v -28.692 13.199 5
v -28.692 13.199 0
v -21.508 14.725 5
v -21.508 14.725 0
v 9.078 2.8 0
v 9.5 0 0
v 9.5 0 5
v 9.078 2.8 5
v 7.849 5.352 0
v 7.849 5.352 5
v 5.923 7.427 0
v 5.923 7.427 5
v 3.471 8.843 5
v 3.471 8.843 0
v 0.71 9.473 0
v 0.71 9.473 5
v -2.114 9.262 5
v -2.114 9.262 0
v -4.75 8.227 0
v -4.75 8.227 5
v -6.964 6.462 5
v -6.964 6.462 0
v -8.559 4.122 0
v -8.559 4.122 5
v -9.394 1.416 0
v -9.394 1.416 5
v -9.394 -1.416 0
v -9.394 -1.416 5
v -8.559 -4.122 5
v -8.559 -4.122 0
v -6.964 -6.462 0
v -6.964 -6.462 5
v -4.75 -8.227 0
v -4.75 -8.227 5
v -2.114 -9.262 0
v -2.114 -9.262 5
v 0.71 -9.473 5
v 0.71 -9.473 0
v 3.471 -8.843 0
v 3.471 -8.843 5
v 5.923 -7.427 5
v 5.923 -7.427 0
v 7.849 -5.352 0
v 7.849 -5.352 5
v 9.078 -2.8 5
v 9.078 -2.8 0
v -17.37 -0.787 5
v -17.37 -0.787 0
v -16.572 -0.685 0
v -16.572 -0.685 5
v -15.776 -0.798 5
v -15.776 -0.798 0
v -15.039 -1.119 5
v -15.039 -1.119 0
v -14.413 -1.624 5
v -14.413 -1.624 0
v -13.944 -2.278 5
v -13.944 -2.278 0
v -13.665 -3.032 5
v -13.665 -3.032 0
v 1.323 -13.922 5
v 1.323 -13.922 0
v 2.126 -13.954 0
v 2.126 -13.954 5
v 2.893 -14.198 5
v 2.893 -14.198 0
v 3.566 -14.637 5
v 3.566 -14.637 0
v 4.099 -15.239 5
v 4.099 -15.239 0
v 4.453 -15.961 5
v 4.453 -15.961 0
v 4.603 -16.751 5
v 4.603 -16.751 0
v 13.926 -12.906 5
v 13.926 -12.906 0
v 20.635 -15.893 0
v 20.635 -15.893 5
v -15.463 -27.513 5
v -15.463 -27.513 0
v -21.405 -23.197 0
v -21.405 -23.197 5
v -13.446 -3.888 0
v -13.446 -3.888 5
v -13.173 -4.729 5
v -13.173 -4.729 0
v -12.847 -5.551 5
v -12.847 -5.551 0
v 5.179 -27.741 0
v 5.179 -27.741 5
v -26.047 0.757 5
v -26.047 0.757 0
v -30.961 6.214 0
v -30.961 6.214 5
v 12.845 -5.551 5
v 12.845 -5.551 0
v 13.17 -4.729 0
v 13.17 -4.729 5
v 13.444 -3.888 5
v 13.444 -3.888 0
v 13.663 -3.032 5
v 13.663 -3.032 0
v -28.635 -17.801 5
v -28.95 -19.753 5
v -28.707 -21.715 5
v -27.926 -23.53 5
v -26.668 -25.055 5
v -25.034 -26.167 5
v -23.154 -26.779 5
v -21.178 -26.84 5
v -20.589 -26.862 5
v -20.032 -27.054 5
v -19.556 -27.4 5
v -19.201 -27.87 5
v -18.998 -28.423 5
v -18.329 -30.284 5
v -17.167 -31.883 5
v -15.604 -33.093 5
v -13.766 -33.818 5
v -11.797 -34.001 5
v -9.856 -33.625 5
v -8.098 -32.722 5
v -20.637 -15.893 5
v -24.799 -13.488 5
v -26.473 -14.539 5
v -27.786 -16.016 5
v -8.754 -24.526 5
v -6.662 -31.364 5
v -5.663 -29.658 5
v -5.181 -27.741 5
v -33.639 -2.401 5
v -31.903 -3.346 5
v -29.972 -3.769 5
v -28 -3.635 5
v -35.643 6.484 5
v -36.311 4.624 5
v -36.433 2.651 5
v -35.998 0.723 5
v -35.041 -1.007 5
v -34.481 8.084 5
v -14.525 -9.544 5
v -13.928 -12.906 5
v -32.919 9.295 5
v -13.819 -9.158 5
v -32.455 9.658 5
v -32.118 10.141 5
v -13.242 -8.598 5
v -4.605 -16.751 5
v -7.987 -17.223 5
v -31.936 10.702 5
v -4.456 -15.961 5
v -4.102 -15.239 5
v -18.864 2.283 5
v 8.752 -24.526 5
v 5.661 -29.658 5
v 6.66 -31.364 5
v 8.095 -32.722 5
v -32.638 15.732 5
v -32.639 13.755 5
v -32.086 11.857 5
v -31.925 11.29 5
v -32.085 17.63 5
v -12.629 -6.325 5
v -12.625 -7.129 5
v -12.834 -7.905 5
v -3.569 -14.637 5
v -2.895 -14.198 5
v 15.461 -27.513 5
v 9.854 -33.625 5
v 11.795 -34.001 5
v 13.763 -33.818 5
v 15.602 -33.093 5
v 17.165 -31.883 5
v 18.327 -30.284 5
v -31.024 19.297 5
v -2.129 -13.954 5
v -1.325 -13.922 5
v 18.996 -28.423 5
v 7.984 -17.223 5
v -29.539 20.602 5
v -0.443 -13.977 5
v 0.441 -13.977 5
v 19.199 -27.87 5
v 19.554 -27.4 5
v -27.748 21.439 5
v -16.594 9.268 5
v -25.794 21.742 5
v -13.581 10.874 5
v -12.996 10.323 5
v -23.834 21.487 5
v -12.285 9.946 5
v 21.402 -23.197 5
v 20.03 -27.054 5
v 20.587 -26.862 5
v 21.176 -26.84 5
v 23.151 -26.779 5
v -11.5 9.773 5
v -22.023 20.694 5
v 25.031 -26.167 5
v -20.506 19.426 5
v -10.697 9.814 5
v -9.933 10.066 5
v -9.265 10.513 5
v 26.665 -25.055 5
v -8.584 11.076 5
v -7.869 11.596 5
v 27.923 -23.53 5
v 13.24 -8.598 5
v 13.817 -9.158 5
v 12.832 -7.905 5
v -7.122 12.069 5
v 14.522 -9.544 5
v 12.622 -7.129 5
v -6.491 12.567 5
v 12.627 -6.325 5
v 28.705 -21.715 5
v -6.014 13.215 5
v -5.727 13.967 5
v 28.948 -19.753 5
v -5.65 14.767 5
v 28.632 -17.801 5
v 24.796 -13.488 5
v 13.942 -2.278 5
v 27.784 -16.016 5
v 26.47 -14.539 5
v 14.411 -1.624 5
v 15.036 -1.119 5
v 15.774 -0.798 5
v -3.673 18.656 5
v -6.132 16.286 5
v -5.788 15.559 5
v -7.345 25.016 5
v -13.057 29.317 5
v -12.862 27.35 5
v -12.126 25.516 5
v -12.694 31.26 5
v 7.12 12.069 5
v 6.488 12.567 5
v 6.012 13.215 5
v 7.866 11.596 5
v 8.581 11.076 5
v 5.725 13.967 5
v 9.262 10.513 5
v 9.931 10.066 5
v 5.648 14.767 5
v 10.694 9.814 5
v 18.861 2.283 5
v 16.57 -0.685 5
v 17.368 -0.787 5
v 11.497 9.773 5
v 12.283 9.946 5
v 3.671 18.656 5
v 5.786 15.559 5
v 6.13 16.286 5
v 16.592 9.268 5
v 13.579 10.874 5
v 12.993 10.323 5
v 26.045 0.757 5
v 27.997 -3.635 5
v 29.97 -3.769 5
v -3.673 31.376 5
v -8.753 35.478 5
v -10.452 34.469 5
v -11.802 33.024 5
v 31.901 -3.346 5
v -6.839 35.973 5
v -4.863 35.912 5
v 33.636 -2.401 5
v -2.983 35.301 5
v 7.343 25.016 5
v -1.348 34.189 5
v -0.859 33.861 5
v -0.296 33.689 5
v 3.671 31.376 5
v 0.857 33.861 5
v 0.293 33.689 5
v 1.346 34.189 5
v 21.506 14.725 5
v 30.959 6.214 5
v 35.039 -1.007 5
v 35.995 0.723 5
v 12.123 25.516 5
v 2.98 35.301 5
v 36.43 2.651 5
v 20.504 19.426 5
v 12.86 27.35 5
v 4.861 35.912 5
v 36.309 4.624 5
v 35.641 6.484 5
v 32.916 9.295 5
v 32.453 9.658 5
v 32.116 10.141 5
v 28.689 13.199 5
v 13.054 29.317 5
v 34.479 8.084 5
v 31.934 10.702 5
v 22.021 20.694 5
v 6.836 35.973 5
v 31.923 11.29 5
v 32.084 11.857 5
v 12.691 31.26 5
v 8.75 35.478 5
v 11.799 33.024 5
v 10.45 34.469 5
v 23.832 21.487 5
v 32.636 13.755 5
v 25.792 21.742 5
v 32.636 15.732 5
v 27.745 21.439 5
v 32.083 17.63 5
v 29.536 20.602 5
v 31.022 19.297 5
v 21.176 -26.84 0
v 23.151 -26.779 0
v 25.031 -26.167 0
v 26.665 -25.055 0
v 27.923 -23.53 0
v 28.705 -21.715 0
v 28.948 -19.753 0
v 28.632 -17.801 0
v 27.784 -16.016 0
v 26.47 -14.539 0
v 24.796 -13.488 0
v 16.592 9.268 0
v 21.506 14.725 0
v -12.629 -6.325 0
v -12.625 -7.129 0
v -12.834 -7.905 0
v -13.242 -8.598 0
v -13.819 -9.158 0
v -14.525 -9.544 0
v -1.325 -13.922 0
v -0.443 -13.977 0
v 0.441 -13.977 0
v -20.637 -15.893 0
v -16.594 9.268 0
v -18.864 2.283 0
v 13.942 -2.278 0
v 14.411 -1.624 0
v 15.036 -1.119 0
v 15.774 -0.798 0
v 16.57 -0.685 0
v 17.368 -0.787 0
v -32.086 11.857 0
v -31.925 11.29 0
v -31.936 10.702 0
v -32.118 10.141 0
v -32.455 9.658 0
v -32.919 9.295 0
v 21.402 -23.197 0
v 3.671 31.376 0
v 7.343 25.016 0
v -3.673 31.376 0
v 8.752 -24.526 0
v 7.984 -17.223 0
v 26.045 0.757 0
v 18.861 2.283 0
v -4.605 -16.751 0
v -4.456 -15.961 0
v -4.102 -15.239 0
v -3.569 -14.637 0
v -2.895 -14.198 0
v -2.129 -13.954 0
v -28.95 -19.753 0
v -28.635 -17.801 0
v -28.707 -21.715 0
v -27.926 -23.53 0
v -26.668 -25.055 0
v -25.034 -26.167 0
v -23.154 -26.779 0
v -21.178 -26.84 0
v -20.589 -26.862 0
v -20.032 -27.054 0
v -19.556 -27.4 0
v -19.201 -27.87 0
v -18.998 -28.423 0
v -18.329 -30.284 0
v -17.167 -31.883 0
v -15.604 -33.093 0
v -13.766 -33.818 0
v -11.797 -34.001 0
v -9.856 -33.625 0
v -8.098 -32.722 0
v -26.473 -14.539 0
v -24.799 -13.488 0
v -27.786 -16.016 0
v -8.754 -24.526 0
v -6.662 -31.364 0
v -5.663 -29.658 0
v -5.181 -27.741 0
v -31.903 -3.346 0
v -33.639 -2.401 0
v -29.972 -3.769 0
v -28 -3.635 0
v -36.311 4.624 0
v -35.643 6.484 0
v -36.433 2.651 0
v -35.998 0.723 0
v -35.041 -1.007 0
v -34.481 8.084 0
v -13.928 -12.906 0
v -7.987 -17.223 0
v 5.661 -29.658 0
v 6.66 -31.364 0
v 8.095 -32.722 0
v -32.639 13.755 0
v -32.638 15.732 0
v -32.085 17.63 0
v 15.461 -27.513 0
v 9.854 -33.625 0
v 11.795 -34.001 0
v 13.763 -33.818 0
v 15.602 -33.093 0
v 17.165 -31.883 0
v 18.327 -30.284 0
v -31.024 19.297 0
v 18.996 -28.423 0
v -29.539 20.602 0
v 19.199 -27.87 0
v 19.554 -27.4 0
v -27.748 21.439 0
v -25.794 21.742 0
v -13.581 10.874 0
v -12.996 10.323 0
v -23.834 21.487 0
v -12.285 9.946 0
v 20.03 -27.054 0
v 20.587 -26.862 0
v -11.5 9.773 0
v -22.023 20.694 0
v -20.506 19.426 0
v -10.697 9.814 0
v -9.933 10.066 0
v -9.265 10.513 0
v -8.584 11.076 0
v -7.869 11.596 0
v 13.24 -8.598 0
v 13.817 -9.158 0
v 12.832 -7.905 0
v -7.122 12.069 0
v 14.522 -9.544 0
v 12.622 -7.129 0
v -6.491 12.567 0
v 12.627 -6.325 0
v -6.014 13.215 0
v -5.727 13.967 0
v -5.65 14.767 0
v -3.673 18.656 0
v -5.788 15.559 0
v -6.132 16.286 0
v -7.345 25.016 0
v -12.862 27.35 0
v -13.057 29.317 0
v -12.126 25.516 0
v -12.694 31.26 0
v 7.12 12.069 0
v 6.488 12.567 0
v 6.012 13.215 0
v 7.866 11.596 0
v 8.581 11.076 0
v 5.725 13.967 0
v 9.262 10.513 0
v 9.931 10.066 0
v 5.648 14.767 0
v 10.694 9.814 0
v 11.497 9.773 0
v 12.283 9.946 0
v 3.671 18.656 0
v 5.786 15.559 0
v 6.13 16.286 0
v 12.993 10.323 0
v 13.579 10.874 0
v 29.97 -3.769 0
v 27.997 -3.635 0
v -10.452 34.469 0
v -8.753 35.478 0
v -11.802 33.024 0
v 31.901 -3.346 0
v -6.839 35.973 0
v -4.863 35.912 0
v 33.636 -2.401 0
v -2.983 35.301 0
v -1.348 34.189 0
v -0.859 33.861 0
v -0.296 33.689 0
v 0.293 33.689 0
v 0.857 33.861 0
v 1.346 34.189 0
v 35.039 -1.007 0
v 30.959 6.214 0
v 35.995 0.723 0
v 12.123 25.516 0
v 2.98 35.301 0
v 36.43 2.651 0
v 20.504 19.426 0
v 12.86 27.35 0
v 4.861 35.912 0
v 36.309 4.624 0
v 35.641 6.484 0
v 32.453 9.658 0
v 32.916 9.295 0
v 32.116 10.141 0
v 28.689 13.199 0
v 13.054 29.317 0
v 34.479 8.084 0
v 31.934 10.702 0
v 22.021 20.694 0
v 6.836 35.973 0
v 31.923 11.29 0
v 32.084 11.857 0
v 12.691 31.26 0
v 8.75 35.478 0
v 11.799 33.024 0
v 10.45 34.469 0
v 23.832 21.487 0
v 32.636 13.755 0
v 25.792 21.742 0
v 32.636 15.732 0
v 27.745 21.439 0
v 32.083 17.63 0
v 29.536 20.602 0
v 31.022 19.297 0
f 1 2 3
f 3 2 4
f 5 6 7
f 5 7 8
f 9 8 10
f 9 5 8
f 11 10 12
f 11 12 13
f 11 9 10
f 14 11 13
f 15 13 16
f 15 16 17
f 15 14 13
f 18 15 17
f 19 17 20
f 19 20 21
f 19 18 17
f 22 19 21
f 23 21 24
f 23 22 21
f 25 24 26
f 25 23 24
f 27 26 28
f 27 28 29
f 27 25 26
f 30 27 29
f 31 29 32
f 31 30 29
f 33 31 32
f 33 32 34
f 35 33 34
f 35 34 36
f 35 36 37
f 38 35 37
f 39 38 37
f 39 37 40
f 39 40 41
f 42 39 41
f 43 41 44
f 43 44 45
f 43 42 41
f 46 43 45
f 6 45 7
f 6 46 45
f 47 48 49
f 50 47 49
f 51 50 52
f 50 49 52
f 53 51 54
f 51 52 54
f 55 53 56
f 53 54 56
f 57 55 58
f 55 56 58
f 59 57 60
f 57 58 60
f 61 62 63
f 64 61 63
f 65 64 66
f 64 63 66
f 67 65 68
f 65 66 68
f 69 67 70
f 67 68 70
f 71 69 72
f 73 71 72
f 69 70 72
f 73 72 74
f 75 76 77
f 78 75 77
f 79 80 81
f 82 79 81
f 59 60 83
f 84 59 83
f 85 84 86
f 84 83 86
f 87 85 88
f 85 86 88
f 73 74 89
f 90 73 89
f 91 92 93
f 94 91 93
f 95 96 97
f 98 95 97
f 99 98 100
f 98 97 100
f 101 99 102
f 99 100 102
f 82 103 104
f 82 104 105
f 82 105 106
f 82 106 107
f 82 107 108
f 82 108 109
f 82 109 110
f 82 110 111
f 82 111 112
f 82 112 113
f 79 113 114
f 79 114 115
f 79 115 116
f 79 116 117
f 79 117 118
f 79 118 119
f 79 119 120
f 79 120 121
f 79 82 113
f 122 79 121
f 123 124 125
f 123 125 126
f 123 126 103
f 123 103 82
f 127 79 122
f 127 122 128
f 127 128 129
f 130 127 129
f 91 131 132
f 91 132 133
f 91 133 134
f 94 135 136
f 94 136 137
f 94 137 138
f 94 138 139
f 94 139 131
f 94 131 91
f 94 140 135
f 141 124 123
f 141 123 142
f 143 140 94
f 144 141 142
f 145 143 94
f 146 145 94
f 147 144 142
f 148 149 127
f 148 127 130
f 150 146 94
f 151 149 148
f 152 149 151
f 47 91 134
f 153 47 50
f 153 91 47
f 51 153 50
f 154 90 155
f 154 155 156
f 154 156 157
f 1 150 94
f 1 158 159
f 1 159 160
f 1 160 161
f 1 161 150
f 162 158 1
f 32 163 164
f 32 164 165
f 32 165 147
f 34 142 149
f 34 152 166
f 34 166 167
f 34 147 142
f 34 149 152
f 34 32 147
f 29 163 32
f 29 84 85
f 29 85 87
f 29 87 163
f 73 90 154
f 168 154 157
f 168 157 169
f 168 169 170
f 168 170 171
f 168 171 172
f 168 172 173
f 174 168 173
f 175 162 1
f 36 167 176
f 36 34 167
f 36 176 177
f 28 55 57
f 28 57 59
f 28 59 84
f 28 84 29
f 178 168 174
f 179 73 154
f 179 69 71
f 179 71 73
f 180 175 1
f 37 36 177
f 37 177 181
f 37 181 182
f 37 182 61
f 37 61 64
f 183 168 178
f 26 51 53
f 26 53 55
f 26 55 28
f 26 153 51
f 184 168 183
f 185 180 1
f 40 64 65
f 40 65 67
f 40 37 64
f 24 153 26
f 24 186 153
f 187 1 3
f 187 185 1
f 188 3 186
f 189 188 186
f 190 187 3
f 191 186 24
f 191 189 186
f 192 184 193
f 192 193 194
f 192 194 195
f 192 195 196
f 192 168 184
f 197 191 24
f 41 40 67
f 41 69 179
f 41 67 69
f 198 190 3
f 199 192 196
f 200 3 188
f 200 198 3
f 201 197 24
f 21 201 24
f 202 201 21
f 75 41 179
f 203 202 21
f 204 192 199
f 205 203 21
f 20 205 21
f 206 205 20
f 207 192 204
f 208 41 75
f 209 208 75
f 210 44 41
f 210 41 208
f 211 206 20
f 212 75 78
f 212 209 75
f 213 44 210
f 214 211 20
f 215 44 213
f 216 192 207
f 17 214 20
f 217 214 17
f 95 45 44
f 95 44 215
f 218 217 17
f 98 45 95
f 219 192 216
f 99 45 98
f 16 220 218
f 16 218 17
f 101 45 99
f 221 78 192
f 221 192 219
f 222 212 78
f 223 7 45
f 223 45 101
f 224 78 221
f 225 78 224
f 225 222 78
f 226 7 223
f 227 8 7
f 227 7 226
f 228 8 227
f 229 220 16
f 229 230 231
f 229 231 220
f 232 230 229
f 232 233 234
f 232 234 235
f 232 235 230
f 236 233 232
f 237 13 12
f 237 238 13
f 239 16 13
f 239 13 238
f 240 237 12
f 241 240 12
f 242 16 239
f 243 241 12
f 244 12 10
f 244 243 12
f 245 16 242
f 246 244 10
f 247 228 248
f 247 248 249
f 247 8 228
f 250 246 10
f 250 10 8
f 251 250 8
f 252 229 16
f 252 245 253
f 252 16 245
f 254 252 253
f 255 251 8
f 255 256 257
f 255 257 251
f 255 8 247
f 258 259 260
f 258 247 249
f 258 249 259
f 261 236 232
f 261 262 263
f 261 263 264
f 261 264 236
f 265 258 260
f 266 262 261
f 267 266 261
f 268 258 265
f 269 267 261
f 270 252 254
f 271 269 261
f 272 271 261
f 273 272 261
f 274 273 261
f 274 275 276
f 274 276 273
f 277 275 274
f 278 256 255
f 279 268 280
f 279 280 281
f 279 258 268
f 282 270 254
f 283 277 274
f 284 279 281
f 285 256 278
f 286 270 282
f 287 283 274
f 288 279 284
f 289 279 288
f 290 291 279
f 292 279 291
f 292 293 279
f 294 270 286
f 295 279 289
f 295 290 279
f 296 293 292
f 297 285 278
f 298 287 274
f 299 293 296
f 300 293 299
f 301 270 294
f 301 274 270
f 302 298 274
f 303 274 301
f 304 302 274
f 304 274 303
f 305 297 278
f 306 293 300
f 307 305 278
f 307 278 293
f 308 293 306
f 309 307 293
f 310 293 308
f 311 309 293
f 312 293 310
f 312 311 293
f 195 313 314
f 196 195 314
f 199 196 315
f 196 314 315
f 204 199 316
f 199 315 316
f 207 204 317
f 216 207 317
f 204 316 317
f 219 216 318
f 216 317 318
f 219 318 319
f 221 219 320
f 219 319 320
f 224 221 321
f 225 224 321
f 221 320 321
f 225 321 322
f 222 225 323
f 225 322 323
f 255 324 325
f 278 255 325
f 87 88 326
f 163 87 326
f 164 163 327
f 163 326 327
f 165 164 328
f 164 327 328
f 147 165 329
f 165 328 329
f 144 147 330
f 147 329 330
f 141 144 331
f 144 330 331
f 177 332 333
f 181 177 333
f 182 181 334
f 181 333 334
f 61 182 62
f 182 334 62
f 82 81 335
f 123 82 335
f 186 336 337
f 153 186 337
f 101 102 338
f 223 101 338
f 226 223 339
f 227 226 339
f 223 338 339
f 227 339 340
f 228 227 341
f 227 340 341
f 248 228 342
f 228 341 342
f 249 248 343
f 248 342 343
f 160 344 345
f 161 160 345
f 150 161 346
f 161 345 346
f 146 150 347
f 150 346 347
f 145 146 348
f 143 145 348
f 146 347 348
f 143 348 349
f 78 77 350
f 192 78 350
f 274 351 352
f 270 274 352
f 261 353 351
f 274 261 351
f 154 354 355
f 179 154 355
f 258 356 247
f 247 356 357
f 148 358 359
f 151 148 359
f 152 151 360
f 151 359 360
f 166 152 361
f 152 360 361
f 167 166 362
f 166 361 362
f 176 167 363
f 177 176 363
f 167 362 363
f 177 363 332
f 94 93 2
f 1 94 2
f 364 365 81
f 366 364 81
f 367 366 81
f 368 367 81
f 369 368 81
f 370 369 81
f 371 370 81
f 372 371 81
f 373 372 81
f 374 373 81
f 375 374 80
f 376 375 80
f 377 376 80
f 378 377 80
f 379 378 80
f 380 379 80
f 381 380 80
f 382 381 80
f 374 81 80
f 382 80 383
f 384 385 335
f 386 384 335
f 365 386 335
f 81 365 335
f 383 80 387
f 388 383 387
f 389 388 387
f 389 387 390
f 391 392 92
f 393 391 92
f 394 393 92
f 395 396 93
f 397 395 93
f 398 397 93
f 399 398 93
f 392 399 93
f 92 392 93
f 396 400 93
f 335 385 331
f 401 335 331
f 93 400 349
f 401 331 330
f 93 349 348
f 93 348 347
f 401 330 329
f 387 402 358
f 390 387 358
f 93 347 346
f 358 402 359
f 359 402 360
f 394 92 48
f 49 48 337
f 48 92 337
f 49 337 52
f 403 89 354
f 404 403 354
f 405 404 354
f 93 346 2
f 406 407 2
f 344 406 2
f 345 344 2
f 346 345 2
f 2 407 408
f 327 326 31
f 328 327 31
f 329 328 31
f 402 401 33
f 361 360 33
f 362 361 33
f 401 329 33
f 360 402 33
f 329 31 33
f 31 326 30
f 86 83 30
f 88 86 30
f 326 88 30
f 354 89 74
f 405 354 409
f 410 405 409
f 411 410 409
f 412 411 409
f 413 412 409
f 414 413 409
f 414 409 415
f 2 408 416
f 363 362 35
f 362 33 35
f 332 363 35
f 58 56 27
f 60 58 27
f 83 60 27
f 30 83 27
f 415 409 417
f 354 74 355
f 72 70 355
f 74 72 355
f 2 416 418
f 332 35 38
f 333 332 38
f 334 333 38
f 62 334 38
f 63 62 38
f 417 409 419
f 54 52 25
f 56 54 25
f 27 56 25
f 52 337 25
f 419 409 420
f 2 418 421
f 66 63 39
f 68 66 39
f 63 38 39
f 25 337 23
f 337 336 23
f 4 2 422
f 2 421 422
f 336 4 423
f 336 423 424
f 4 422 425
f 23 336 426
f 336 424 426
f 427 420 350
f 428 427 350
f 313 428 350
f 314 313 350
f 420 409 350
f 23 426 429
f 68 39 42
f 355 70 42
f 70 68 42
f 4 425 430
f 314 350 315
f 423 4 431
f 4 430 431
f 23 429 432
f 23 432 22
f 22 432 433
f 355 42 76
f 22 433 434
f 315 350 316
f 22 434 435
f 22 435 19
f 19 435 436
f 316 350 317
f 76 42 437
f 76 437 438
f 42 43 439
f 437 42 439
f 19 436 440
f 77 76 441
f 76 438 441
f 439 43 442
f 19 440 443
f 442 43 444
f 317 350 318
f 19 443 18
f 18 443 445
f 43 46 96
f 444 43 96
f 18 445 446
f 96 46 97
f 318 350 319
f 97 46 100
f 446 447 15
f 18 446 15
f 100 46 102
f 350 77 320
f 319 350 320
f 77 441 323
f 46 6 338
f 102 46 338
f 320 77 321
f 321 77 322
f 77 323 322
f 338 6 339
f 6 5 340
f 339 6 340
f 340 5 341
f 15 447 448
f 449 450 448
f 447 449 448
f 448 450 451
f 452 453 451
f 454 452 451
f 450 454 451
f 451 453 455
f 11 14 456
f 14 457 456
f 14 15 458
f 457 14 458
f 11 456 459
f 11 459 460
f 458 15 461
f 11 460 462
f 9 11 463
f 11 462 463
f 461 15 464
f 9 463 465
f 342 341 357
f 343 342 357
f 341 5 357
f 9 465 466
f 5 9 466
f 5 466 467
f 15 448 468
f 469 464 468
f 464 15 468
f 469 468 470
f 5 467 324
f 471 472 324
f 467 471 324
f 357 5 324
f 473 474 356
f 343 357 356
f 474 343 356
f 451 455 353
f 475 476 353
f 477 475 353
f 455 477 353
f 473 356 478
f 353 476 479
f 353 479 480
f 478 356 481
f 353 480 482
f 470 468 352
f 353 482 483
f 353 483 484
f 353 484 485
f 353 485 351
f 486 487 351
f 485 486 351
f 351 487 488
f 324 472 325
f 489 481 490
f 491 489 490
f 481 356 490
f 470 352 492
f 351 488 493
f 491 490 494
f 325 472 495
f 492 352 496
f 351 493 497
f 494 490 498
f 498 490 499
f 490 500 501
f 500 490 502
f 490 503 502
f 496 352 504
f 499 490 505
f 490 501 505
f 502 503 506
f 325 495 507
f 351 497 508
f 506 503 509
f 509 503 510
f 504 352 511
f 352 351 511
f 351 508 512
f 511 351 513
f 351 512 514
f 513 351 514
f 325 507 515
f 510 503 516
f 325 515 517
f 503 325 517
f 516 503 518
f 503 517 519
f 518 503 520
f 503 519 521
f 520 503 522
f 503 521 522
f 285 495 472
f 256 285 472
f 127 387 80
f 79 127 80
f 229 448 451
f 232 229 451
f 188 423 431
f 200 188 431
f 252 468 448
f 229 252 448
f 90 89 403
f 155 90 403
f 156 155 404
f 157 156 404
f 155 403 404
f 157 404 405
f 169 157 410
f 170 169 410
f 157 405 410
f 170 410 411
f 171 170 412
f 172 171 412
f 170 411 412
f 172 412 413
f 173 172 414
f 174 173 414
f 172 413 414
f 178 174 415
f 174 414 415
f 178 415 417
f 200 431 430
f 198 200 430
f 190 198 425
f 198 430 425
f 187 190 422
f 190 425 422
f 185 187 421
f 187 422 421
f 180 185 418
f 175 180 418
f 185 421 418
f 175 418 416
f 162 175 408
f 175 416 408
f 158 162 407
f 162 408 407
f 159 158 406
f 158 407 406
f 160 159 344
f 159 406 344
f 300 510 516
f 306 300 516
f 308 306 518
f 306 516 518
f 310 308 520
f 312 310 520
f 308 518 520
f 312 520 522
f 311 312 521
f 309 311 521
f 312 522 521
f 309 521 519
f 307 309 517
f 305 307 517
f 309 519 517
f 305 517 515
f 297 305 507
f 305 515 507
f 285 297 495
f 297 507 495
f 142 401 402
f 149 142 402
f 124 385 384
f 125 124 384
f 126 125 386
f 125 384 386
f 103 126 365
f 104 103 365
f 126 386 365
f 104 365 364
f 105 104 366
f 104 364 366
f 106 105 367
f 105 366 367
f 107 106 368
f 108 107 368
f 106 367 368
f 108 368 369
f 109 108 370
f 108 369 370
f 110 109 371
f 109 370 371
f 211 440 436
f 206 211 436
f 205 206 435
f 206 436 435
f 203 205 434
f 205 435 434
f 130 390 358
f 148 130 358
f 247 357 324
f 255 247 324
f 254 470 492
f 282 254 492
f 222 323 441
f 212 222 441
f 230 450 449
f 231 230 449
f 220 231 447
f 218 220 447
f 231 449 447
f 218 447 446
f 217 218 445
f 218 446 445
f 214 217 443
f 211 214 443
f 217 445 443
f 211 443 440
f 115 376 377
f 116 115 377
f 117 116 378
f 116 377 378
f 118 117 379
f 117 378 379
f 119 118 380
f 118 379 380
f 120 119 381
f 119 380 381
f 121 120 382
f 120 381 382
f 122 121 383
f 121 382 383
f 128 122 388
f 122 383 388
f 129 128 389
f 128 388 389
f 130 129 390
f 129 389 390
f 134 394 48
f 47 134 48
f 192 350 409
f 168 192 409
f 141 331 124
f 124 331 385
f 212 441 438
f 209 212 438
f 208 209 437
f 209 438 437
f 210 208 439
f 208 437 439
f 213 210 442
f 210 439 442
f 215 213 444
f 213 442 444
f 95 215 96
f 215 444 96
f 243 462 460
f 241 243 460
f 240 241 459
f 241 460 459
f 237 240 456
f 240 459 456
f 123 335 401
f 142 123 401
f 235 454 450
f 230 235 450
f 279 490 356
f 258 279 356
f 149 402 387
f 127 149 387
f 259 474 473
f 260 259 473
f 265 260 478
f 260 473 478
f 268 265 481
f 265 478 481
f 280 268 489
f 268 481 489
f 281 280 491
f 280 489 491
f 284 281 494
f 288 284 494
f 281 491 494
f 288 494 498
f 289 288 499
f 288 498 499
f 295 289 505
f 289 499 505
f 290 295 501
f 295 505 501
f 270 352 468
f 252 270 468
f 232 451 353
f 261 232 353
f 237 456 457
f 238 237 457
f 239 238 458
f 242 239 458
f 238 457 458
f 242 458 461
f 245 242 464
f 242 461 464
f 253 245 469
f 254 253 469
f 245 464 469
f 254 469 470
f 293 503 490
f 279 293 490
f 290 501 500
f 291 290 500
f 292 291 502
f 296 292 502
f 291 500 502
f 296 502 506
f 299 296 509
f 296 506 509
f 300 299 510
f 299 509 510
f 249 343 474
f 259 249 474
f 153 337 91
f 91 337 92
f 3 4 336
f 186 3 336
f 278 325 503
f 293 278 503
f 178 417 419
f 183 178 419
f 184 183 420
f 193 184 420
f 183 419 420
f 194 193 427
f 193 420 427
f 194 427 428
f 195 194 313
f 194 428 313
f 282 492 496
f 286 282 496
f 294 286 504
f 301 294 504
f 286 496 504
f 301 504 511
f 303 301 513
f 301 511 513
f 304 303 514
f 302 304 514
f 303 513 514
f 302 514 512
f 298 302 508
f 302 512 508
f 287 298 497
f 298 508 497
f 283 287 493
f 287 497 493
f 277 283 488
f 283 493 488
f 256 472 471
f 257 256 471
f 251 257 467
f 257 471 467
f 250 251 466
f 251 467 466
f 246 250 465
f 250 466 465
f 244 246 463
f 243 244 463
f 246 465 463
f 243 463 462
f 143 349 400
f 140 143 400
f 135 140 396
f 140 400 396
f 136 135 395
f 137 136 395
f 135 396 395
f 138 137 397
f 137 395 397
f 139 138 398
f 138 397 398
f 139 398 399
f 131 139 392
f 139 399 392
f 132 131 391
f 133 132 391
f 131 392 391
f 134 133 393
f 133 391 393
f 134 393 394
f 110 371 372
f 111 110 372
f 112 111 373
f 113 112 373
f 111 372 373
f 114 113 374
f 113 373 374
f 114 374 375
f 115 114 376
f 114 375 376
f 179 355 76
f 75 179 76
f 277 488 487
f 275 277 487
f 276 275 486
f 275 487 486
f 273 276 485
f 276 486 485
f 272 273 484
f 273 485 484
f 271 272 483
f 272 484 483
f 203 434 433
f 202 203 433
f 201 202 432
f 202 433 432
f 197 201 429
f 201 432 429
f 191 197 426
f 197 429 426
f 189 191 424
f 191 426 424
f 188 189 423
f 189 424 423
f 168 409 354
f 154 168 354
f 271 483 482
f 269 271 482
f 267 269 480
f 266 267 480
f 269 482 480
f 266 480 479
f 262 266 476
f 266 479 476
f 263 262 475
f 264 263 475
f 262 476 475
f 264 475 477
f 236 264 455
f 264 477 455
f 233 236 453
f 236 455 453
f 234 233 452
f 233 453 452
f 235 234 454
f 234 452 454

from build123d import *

# Parameters (mm, degrees)
F0_R     = 9.5
F1_DEPTH = 5


# Not quite as in the source:
# - a feature names something its author has since deleted; it is built from what else it names


with BuildPart() as f1:
    # F0 (on Top) → F1 (new body)
    with BuildSketch(Plane.XY):
        with BuildLine():
            ThreePointArc((-13.665469042, -3.0319204432), (-13.3159762762, 4.3418317), (-9.2645390994, 10.5127491897))
            ThreePointArc((-9.2645390994, 10.5127491897), (-11.4998669549, 9.7726015122), (-13.5809814233, 10.8741784618))
            Line((-13.5809814233, 10.8741784618), (-20.506494271, 19.426474585))
            ThreePointArc((-20.506494271, 19.426474585), (-29.538567909, 20.601795911), (-32.0861364699, 11.8571044442))
            ThreePointArc((-32.0861364699, 11.8571044442), (-32.0062029861, 10.4146544851), (-32.9187213461, 9.2946716776))
            ThreePointArc((-32.9187213461, 9.2946716776), (-35.997695766, 0.7226444411), (-27.9997581563, -3.6354203143))
            Line((-27.9997581563, -3.6354203143), (-17.3699870332, -0.7871817262))
            ThreePointArc((-17.3699870332, -0.7871817262), (-15.0388393758, -1.1192356462), (-13.665469042, -3.0319204432))
        make_face()
        Polygon((-28.6916231536, 13.1985965214), (-21.5082094645, 14.7254782362), (-16.5941842664, 9.267900353), (-18.8635727573, 2.2834407549), (-26.0469864464, 0.7565590401), (-30.9610116446, 6.2141369233), align=None, mode=Mode.SUBTRACT)
        with BuildLine():
            ThreePointArc((9.2621690031, 10.5127491897), (8.227808484, 11.3418317), (7.1196691813, 12.0693664265))
            ThreePointArc((7.1196691813, 12.0693664265), (-0.0011850481, 14.0155937788), (-7.1220392775, 12.0693664265))
            ThreePointArc((-7.1220392775, 12.0693664265), (-8.2301785802, 11.3418317), (-9.2645390994, 10.5127491897))
            ThreePointArc((-9.2645390994, 10.5127491897), (-13.3159762762, 4.3418317), (-13.665469042, -3.0319204432))
            ThreePointArc((-13.665469042, -3.0319204432), (-13.3159762762, -4.3106441425), (-12.847106931, -5.5505800398))
            ThreePointArc((-12.847106931, -5.5505800398), (-8.2301785802, -11.3106441425), (-1.3253227589, -13.9216462393))
            ThreePointArc((-1.3253227589, -13.9216462393), (-0.0011850481, -13.9844062212), (1.3229526627, -13.9216462393))
            ThreePointArc((1.3229526627, -13.9216462393), (8.227808484, -11.3106441425), (12.8447368348, -5.5505800398))
            ThreePointArc((12.8447368348, -5.5505800398), (13.31360618, -4.3106441425), (13.6630989458, -3.0319204432))
            ThreePointArc((13.6630989458, -3.0319204432), (13.9146328566, -1.5173811207), (13.9988149519, 0.0155937788))
            ThreePointArc((13.9988149519, 0.0155937788), (12.7598289539, 5.7737637694), (9.2621690031, 10.5127491897))
        make_face()
        Circle(F0_R, mode=Mode.SUBTRACT)
        with BuildLine():
            ThreePointArc((-1.3253227589, -13.9216462393), (-8.2301785802, -11.3106441425), (-12.847106931, -5.5505800398))
            ThreePointArc((-12.847106931, -5.5505800398), (-12.8339389546, -7.9052213736), (-14.5247006287, -9.5440728519))
            Line((-14.5247006287, -9.5440728519), (-24.7985187507, -13.4878221314))
            ThreePointArc((-24.7985187507, -13.4878221314), (-28.7073800051, -21.7146403569), (-21.1779261823, -26.8397803113))
            ThreePointArc((-21.1779261823, -26.8397803113), (-19.7813739443, -27.2095006015), (-18.998190678, -28.4234508549))
            ThreePointArc((-18.998190678, -28.4234508549), (-11.7971637379, -34.0006316328), (-5.1808992125, -27.7408570242))
            Line((-5.1808992125, -27.7408570242), (-4.6049551583, -16.7511898031))
            ThreePointArc((-4.6049551583, -16.7511898031), (-3.5687888714, -14.6367469374), (-1.3253227589, -13.9216462393))
        make_face()
        Polygon((-21.4047986615, -23.1968624525), (-20.6371525584, -15.8931976559), (-13.9281702523, -12.906166284), (-7.9868340493, -17.2227997087), (-8.7544801524, -24.5264645053), (-15.4634624585, -27.5134958771), align=None, mode=Mode.SUBTRACT)
        with BuildLine():
            ThreePointArc((7.1196691813, 12.0693664265), (5.7249926142, 13.9665713389), (6.1295548123, 16.2862348132))
            Line((6.1295548123, 16.2862348132), (12.1231706049, 25.5155937788))
            ThreePointArc((12.1231706049, 25.5155937788), (10.4499033622, 34.4688005315), (1.34596558, 34.1894239382))
            ThreePointArc((1.34596558, 34.1894239382), (-0.0011850481, 33.6676611266), (-1.3483356762, 34.1894239382))
            ThreePointArc((-1.3483356762, 34.1894239382), (-10.4522734584, 34.4688005315), (-12.1255407011, 25.5155937788))
            Line((-12.1255407011, 25.5155937788), (-6.1319249085, 16.2862348132))
            ThreePointArc((-6.1319249085, 16.2862348132), (-5.7273627104, 13.9665713389), (-7.1220392775, 12.0693664265))
            ThreePointArc((-7.1220392775, 12.0693664265), (-0.0011850481, 14.0155937788), (7.1196691813, 12.0693664265))
        make_face()
        Polygon((-7.3450804722, 25.0155937788), (-3.6731327602, 31.3755937788), (3.6707626639, 31.3755937788), (7.342710376, 25.0155937788), (3.6707626639, 18.6555937788), (-3.6731327602, 18.6555937788), align=None, mode=Mode.SUBTRACT)
        with BuildLine():
            ThreePointArc((14.5223305325, -9.5440728519), (12.8315688584, -7.9052213736), (12.8447368348, -5.5505800398))
            ThreePointArc((12.8447368348, -5.5505800398), (8.227808484, -11.3106441425), (1.3229526627, -13.9216462393))
            ThreePointArc((1.3229526627, -13.9216462393), (3.5664187752, -14.6367469374), (4.6025850621, -16.7511898031))
            Line((4.6025850621, -16.7511898031), (5.1785291162, -27.7408570242))
            ThreePointArc((5.1785291162, -27.7408570242), (11.7947936417, -34.0006316328), (18.9958205818, -28.4234508549))
            ThreePointArc((18.9958205818, -28.4234508549), (19.7790038481, -27.2095006015), (21.1755560861, -26.8397803113))
            ThreePointArc((21.1755560861, -26.8397803113), (28.7050099089, -21.7146403569), (24.7961486545, -13.4878221314))
            Line((24.7961486545, -13.4878221314), (14.5223305325, -9.5440728519))
        make_face()
        Polygon((7.9844639531, -17.2227997087), (13.9258001561, -12.906166284), (20.6347824622, -15.8931976559), (21.4024285653, -23.1968624525), (15.4610923623, -27.5134958771), (8.7521100562, -24.5264645053), align=None, mode=Mode.SUBTRACT)
        with BuildLine():
            ThreePointArc((13.5786113271, 10.8741784618), (11.4974968587, 9.7726015122), (9.2621690031, 10.5127491897))
            ThreePointArc((9.2621690031, 10.5127491897), (12.7598289539, 5.7737637694), (13.9988149519, 0.0155937788))
            ThreePointArc((13.9988149519, 0.0155937788), (13.9146328566, -1.5173811207), (13.6630989458, -3.0319204432))
            ThreePointArc((13.6630989458, -3.0319204432), (15.0364692796, -1.1192356462), (17.367616937, -0.7871817262))
            Line((17.367616937, -0.7871817262), (27.99738806, -3.6354203143))
            ThreePointArc((27.99738806, -3.6354203143), (35.9953256698, 0.7226444411), (32.9163512498, 9.2946716776))
            ThreePointArc((32.9163512498, 9.2946716776), (32.0038328898, 10.4146544851), (32.0837663737, 11.8571044442))
            ThreePointArc((32.0837663737, 11.8571044442), (29.5361978128, 20.601795911), (20.5041241748, 19.426474585))
            Line((20.5041241748, 19.426474585), (13.5786113271, 10.8741784618))
        make_face()
        Polygon((18.8612026611, 2.2834407549), (16.5918141702, 9.267900353), (21.5058393683, 14.7254782362), (28.6892530574, 13.1985965214), (30.9586415484, 6.2141369233), (26.0446163502, 0.7565590401), align=None, mode=Mode.SUBTRACT)
    extrude(amount=F1_DEPTH)


solid = f1.part
